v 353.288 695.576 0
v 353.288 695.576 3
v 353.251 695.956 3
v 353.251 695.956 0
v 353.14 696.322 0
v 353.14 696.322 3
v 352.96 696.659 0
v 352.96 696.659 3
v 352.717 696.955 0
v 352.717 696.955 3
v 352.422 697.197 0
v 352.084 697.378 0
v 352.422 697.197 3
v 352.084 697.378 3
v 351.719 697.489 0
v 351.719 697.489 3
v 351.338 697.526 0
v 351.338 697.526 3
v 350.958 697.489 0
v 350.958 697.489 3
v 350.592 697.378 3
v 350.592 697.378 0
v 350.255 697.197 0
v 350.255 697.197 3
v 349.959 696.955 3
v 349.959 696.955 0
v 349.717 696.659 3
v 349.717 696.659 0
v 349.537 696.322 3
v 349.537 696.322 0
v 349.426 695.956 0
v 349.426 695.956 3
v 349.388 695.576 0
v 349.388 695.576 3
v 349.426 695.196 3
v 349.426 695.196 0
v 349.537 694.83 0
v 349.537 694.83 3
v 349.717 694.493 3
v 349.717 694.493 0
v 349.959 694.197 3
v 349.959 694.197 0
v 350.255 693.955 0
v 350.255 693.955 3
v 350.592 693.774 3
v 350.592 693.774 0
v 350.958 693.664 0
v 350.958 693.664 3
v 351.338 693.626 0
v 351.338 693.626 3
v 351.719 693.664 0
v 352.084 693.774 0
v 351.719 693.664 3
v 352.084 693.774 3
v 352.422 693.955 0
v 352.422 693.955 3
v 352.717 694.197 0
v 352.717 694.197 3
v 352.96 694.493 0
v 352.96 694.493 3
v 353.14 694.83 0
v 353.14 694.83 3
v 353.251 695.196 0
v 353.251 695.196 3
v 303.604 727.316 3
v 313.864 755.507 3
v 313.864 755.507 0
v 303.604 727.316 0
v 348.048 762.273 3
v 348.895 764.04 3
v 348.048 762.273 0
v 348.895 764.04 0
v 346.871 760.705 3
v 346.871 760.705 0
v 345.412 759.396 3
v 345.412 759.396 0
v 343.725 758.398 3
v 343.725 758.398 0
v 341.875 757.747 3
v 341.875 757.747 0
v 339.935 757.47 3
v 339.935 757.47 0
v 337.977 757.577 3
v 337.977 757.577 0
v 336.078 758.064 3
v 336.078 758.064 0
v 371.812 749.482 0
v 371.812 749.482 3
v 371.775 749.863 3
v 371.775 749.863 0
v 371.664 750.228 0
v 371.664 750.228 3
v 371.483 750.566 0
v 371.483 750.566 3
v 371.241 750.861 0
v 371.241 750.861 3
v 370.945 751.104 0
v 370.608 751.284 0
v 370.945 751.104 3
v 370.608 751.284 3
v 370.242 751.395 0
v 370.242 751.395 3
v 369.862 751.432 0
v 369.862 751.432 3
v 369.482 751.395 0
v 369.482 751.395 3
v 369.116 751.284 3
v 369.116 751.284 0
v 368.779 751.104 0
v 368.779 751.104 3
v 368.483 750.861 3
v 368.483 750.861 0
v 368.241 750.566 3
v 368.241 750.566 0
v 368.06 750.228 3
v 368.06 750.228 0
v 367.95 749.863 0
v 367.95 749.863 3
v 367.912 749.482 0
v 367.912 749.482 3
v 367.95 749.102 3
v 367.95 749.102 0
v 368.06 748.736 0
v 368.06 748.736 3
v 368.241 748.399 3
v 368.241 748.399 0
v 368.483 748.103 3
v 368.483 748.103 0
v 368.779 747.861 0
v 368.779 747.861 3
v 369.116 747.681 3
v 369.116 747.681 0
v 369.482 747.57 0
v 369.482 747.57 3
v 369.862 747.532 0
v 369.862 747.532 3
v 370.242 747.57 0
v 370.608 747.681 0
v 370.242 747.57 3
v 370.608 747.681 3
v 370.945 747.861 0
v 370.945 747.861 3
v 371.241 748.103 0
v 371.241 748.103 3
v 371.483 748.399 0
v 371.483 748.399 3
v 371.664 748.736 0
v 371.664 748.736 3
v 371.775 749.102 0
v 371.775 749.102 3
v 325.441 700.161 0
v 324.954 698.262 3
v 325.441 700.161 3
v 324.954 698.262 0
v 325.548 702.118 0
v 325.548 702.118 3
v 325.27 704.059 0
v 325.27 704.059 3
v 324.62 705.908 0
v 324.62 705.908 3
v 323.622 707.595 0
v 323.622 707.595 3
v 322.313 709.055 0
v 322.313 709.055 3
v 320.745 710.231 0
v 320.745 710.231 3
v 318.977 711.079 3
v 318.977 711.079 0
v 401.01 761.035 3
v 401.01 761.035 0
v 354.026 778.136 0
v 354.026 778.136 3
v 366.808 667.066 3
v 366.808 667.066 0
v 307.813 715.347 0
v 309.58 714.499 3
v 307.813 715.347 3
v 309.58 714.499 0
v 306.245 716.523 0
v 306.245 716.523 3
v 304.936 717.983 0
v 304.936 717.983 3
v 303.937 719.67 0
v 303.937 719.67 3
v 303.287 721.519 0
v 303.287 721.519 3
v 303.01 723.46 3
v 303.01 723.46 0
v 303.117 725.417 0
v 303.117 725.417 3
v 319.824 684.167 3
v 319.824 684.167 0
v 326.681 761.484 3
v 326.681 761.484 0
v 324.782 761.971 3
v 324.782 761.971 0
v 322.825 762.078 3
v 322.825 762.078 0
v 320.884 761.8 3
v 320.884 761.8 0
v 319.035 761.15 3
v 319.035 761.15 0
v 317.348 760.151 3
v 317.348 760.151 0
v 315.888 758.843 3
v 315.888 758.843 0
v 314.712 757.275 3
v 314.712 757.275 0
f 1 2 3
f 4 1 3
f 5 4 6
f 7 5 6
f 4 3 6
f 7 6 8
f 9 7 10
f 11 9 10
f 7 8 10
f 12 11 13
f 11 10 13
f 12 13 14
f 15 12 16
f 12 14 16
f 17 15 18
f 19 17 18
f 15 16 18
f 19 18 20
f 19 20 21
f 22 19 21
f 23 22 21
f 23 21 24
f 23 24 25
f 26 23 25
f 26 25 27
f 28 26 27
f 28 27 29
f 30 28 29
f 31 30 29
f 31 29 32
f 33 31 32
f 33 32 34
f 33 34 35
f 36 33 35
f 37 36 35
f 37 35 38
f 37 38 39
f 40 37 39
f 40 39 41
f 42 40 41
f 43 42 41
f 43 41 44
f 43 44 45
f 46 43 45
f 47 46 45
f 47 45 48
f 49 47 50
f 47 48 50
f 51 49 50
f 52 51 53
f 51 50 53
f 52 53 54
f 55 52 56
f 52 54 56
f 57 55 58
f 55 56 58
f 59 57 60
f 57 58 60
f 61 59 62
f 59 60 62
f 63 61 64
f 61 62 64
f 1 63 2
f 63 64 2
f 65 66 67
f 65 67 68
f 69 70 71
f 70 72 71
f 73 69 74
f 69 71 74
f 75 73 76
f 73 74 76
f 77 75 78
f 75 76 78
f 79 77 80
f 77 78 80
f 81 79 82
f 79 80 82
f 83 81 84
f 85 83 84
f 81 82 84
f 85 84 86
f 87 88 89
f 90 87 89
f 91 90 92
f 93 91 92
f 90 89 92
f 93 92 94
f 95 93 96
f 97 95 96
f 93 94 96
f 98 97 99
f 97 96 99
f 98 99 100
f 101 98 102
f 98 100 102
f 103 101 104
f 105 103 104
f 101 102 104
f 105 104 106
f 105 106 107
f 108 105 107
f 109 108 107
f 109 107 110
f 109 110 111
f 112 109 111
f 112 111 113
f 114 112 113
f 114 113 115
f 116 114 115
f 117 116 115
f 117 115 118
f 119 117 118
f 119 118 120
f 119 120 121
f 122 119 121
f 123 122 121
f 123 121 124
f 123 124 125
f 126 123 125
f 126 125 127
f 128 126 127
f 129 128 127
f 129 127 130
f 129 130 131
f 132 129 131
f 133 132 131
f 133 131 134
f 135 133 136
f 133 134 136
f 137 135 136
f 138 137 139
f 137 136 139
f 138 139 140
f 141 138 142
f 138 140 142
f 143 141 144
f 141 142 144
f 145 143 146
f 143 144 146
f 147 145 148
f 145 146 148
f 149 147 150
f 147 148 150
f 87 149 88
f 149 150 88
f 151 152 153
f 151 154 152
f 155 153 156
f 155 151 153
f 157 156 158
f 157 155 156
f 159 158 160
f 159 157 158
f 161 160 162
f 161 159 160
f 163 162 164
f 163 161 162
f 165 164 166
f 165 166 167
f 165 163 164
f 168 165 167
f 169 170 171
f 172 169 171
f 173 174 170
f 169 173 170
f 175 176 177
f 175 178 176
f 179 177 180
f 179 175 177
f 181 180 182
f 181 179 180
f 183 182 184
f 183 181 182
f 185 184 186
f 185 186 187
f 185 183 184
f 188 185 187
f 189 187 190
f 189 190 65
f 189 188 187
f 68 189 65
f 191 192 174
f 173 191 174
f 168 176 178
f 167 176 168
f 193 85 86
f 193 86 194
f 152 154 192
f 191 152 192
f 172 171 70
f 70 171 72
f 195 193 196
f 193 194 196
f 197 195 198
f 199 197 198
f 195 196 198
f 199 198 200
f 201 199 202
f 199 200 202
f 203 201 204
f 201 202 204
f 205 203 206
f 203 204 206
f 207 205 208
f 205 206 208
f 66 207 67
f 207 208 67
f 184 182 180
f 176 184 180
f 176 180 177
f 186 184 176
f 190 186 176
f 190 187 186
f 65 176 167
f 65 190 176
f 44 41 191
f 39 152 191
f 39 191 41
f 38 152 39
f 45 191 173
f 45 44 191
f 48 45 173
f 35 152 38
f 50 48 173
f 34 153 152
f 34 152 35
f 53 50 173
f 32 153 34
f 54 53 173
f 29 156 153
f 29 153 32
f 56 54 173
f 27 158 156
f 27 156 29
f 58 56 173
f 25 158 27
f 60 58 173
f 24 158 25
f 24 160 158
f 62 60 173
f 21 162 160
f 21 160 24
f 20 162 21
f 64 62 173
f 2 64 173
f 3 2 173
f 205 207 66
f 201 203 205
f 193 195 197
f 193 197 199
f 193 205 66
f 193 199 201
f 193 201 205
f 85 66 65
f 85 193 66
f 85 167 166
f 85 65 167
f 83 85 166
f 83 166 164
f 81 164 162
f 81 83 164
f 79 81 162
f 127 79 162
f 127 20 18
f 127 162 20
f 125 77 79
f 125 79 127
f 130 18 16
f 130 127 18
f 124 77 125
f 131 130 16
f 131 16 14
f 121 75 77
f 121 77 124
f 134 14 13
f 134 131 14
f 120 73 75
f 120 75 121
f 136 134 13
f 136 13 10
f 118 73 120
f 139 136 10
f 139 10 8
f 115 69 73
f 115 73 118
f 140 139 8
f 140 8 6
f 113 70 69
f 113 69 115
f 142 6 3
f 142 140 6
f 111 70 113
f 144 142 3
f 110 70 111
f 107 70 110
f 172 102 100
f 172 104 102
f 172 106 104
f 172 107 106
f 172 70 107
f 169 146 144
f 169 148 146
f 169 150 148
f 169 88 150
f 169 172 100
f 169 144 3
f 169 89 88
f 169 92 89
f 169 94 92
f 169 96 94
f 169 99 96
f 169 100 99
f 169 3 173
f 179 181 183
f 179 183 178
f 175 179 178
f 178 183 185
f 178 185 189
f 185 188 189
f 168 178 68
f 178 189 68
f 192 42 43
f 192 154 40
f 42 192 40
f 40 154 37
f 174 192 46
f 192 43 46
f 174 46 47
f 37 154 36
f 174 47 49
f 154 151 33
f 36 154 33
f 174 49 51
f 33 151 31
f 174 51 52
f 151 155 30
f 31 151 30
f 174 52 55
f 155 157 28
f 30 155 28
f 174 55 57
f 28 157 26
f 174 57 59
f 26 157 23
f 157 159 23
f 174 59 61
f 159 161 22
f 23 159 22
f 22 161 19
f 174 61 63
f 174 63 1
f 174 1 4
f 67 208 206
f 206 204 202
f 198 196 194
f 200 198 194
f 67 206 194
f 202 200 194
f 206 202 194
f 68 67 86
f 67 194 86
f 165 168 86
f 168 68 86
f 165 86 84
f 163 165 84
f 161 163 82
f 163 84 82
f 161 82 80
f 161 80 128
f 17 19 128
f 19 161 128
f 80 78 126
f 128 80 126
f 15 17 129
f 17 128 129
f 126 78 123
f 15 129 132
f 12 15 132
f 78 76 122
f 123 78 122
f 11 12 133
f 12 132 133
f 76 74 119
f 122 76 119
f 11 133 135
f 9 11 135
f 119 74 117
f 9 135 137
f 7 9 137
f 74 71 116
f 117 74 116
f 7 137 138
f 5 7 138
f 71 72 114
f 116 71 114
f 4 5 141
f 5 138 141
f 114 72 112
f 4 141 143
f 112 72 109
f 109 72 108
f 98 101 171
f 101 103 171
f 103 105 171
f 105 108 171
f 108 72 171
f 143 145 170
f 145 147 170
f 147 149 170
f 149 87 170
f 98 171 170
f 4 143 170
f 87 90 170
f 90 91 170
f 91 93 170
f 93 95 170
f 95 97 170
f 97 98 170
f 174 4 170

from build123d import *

# Parameters (mm, degrees)
EXTRUDE_1_DEPTH     = 3
CUT_EXTRUDE_1_REACH = 877.393
SKETCH_2_R          = 1.95
EXTRUDE_2_DEPTH     = 3
FILLET_1_R          = 10


with BuildPart() as part:
    # 草图1 → 凸台-拉伸1 (new body)
    with BuildSketch(Plane.XY):
        Polygon((366.808331571, 667.065590198), (401.010345904, 761.034852277), (354.025714865, 778.135859443), (319.823700532, 684.166597365), align=None)
    extrude(amount=EXTRUDE_1_DEPTH)

    # 草图2 → 切除-拉伸1 (cut, up to next)
    with BuildSketch(Plane.XY.offset(3), mode=Mode.PRIVATE) as cut_extrude_1_sk1:
        with Locations((351.338243096, 695.576064033)):
            Circle(SKETCH_2_R)
    cut_extrude_1_tool1 = extrude(cut_extrude_1_sk1.sketch, amount=-CUT_EXTRUDE_1_REACH, mode=Mode.PRIVATE) & part.part
    # 草图2 → 切除-拉伸1 (cut, up to next)
    with BuildSketch(Plane.XY.offset(3), mode=Mode.PRIVATE) as cut_extrude_1_sk2:
        with Locations((369.862047426, 749.482173827)):
            Circle(SKETCH_2_R)
    cut_extrude_1_tool2 = extrude(cut_extrude_1_sk2.sketch, amount=-CUT_EXTRUDE_1_REACH, mode=Mode.PRIVATE) & part.part
    add(cut_extrude_1_tool1.solids().sort_by_distance((351.338243, 695.576064, 3))[0], mode=Mode.SUBTRACT)
    add(cut_extrude_1_tool2.solids().sort_by_distance((369.862047, 749.482174, 3))[0], mode=Mode.SUBTRACT)

    # 草图3 → 凸台-拉伸2 (add)
    with BuildSketch(Plane.XY.offset(3)):
        Polygon((345.475211281, 754.643543924), (317.284432658, 764.904148223), (300.183425492, 717.919517184), (328.374204115, 707.658912884), align=None)
    extrude(amount=-EXTRUDE_2_DEPTH)

    # 圆角1
    fillet_1_edges = [part.edges().sort_by_distance(p)[0] for p in [
        (345.475211281, 754.643543924, 1.5),
        (328.374204115, 707.658912884, 1.5),
        (300.183425492, 717.919517184, 1.5),
        (317.284432658, 764.904148223, 1.5),
    ]]
    fillet(fillet_1_edges, radius=FILLET_1_R)


solid = part.part
